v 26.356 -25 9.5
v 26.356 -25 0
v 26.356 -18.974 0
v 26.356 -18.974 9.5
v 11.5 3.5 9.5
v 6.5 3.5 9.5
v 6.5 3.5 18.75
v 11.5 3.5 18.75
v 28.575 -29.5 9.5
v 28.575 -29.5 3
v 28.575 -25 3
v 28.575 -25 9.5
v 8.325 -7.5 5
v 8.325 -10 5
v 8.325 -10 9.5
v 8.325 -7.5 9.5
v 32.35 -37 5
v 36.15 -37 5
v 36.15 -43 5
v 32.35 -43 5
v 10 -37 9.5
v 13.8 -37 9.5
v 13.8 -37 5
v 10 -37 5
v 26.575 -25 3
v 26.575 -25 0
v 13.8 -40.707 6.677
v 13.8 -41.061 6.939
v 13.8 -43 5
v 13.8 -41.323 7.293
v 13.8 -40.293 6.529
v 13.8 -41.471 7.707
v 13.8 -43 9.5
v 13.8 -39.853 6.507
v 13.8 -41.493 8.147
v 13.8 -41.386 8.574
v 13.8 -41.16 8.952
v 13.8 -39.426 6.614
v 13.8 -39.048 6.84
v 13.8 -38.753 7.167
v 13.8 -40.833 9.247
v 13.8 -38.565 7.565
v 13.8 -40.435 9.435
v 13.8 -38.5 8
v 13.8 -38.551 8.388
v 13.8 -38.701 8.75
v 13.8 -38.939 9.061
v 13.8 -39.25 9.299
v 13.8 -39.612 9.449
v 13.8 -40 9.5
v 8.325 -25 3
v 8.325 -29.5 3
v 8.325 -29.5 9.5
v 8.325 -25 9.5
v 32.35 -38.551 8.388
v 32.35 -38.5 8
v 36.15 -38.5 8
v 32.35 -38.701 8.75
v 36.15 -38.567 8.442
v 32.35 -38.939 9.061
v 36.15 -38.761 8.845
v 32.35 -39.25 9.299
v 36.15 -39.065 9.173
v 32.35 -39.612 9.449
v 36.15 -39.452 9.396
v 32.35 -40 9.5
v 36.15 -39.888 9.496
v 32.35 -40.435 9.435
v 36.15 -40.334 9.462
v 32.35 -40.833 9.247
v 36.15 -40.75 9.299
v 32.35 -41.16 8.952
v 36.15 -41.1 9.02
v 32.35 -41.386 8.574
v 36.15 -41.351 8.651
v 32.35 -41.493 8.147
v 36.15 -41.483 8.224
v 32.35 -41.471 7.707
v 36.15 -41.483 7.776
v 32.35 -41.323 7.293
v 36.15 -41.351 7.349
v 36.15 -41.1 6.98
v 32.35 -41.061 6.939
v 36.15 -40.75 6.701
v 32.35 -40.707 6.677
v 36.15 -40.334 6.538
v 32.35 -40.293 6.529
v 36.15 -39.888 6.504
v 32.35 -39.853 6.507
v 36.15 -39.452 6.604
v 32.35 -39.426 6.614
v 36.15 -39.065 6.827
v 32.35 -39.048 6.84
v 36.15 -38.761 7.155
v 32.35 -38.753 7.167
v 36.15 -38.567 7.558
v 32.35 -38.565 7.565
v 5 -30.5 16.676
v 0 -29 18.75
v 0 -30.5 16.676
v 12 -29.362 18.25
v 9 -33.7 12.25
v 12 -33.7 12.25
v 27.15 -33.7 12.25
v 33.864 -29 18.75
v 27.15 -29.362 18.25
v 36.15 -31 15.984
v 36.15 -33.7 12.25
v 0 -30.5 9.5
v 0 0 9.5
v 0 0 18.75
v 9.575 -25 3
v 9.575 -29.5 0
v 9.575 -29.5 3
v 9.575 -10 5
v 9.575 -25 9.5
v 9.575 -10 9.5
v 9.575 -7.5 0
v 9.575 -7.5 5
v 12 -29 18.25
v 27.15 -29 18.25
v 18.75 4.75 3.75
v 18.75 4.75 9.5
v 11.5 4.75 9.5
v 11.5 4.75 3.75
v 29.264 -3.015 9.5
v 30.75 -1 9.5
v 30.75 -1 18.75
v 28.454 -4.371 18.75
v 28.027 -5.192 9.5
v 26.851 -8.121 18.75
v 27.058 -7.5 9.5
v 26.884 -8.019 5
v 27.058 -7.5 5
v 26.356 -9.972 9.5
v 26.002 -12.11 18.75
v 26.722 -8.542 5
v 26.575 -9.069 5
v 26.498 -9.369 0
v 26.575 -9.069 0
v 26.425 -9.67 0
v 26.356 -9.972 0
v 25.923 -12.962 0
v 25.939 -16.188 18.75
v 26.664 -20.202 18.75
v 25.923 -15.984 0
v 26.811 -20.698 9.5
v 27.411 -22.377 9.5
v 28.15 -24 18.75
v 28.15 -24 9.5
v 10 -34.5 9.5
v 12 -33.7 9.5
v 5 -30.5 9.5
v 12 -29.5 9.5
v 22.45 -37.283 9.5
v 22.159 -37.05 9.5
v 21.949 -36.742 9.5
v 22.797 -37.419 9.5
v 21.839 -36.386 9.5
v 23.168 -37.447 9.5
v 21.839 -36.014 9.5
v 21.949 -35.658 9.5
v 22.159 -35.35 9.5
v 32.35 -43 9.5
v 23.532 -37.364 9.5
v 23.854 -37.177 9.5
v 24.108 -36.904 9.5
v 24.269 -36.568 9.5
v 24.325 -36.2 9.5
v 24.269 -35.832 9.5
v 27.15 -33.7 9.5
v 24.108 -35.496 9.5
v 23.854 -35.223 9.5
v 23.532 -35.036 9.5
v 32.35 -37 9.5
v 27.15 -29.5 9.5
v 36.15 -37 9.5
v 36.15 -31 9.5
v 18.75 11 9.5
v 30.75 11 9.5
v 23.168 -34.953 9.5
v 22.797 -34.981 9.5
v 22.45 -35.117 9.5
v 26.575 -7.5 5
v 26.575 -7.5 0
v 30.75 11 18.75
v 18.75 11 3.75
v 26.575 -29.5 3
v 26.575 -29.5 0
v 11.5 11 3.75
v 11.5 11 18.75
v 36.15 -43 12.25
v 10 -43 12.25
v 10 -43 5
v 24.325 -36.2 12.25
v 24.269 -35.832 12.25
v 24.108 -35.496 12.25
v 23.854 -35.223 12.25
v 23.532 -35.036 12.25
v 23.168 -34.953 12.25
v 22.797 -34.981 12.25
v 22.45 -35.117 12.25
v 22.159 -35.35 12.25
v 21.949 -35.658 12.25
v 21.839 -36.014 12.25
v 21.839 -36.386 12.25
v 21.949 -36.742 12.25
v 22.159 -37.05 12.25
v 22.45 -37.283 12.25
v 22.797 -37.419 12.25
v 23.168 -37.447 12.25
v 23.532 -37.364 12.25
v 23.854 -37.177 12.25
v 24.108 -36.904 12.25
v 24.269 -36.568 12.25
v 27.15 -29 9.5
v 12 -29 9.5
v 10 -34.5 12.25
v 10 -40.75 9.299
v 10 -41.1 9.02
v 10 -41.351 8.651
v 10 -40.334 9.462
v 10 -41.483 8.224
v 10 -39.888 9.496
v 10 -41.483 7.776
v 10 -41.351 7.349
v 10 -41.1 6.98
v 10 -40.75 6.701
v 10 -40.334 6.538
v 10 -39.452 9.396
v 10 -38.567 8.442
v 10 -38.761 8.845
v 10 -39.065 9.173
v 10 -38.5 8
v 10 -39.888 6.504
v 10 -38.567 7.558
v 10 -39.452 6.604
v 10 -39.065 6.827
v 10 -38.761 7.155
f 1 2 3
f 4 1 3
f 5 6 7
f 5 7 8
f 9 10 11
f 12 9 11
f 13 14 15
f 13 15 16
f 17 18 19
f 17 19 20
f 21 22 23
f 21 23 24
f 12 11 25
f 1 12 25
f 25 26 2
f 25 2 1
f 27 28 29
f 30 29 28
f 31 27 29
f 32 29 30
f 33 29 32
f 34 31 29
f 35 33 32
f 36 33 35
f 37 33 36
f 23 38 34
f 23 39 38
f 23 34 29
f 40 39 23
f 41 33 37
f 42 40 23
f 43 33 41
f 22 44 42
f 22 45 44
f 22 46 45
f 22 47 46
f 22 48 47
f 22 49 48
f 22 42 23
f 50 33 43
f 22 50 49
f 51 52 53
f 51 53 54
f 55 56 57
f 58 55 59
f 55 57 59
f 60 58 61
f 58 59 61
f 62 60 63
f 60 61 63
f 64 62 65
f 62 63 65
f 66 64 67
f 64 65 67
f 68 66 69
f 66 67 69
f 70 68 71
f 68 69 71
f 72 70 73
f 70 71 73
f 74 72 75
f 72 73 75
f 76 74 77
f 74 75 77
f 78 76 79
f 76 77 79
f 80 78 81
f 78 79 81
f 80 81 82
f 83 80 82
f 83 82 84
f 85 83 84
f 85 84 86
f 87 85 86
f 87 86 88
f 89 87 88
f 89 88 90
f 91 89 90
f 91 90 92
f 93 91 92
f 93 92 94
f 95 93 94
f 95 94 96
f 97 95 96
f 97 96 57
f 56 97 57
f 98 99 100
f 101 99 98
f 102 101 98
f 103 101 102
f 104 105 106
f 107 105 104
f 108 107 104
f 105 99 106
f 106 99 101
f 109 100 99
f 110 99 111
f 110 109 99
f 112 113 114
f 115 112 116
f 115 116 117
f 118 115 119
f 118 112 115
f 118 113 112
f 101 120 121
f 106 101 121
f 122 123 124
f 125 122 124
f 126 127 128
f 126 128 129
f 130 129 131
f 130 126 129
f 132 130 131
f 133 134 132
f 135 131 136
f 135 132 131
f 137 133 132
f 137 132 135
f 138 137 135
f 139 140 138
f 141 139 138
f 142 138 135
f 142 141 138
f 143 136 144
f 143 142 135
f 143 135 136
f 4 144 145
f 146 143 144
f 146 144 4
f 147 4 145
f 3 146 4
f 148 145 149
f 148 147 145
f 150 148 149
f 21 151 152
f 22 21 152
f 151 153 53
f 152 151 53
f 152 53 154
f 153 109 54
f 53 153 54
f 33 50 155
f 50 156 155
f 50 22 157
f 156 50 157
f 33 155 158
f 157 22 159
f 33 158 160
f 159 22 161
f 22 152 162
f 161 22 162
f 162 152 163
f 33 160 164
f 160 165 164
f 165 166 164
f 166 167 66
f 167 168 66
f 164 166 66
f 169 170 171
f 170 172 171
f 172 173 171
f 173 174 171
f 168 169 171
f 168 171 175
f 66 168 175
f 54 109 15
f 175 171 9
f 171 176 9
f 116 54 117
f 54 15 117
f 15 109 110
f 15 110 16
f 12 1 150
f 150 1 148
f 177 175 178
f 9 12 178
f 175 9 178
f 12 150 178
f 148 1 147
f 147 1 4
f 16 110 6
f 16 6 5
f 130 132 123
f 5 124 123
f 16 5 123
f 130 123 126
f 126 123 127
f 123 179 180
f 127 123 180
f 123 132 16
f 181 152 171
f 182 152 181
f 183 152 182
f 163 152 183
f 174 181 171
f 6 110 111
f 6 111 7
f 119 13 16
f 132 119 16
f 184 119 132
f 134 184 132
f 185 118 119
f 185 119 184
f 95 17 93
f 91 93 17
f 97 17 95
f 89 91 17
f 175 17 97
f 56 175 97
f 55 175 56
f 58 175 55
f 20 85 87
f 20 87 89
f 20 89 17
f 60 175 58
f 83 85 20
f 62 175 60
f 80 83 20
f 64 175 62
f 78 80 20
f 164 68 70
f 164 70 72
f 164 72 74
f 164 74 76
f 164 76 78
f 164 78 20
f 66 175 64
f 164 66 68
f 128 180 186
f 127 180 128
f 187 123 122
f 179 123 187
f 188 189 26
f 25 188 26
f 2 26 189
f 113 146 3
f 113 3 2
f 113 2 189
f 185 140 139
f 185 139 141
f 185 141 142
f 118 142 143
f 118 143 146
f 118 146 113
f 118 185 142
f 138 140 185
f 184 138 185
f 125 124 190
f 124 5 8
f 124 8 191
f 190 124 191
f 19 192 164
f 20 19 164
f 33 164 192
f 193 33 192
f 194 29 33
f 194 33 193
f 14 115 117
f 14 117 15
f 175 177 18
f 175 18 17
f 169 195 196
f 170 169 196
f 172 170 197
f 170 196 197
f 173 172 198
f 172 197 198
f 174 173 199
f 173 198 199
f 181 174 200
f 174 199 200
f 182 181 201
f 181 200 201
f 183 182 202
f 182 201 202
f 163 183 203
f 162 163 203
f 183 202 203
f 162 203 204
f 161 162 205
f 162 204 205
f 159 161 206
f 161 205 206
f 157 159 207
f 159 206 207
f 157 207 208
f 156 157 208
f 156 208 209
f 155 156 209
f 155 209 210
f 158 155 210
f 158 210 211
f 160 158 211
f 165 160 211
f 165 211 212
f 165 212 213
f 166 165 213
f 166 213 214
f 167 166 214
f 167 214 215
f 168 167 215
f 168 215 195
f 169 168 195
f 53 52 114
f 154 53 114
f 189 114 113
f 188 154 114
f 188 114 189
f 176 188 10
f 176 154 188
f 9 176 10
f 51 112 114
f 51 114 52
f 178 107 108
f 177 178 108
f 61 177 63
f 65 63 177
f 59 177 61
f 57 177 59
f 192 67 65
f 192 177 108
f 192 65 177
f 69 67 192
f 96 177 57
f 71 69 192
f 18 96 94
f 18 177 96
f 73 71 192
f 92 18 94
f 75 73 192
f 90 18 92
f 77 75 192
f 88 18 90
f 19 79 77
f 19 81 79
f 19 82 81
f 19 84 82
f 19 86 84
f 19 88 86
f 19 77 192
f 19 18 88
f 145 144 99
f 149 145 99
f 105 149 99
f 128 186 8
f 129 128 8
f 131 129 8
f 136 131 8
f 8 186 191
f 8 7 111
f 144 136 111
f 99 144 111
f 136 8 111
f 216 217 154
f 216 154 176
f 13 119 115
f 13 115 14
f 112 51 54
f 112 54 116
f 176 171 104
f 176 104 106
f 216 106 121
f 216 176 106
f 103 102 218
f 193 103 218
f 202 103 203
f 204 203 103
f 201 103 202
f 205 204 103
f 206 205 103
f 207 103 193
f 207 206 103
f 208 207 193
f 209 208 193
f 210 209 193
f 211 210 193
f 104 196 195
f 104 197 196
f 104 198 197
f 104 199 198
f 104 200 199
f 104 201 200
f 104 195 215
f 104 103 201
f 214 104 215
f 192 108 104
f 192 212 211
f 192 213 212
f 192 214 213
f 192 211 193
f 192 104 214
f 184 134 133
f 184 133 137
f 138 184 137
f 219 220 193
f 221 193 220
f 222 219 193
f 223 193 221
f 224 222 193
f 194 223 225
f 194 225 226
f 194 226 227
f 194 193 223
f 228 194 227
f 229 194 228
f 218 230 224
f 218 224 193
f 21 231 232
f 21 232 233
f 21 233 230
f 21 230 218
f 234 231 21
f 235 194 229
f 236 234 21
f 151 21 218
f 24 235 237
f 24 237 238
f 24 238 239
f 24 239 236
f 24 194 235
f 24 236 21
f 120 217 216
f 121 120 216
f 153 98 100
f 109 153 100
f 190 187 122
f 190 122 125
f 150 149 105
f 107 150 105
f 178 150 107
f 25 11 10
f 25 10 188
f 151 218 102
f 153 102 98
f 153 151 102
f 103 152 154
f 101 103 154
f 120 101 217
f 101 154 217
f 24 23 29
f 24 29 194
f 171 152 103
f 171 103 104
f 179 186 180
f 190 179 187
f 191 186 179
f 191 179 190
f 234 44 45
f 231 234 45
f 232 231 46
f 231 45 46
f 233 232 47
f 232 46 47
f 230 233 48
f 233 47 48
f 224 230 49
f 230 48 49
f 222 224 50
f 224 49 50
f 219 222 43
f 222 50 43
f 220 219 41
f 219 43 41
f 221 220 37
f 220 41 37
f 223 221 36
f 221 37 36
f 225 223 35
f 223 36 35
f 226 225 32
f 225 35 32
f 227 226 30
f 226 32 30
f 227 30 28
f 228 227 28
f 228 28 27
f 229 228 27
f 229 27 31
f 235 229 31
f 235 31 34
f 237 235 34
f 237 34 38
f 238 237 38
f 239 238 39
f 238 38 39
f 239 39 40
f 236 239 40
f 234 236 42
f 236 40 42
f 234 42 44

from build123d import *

# Parameters (mm, degrees)
BOSS_EXTRUDE1_DEPTH      = 18.75
SKETCH4_W                = 36.15
SKETCH4_H                = 12.5
CUT_EXTRUDE1_DEPTH       = 5
CUT_EXTRUDE2_DEPTH       = 6
CUT_EXTRUDE2_DEPTH_BACK  = 4.5
SKETCH6_R                = 1.5
CUT_EXTRUDE3_DEPTH       = 60.223179584
SKETCH7_W                = 2
SKETCH7_H                = 4.5
SKETCH7_W_2              = 1.25
CUT_EXTRUDE4_DEPTH       = 3
SKETCH7_3_W              = 1.25
SKETCH7_3_H              = 2.5
CUT_EXTRUDE5_DEPTH       = 5
CUT_EXTRUDE6_DEPTH       = 9.5
SKETCH9_W                = 7.25
SKETCH9_H                = 6.25
BOSS_EXTRUDE2_DEPTH      = 5.75
CUT_EXTRUDE7_DEPTH       = 9.5
CUT_EXTRUDE8_DEPTH       = 12
CUT_EXTRUDE8_DEPTH_BACK  = 54.706470746
CUT_EXTRUDE11_DEPTH      = 6
CUT_EXTRUDE11_DEPTH_BACK = 2.75
SKETCH12_W               = 15.15
SKETCH12_H               = 4.7
SKETCH13_R               = 1.25
CUT_EXTRUDE12_DEPTH      = 58.496825999


with BuildPart() as part:
    # Sketch1 → Boss-Extrude1 (new body)
    with BuildSketch(Plane.XY):
        with BuildLine():
            Line((11.5, 3.5), (11.5, 11))
            Line((11.5, 11), (30.75, 11))
            Line((30.75, 11), (30.75, -1))
            ThreePointArc((30.75, -1), (26.002013283, -12.110227589), (28.15, -24))
            Line((28.15, -24), (36.15, -31))
            Line((36.15, -31), (36.15, -43))
            Line((36.15, -43), (10, -43))
            Line((10, -43), (10, -34.5))
            Line((10, -34.5), (5, -30.5))
            Line((5, -30.5), (0, -30.5))
            Line((0, -30.5), (0, 0))
            Line((0, 0), (6.5, 3.5))
            Line((6.5, 3.5), (11.5, 3.5))
        make_face()
    extrude(amount=BOSS_EXTRUDE1_DEPTH)

    # Sketch4 → Cut-Extrude1 (cut)
    with BuildSketch(Plane(origin=(0, 0, 0), x_dir=(-1, 0, 0), z_dir=(0, 0, -1))):
        with Locations((-18.075, -36.75)):
            Rectangle(SKETCH4_W, SKETCH4_H)
    extrude(amount=-CUT_EXTRUDE1_DEPTH, mode=Mode.SUBTRACT)

    # Sketch5 → Cut-Extrude2 (cut, two sides: drawn at the far end of the back side and taken through both)
    with BuildSketch(Plane(origin=(0, 0, 5), x_dir=(-1, 0, 0), z_dir=(0, 0, -1)).offset(-CUT_EXTRUDE2_DEPTH_BACK)):
        Polygon((-32.35, -43), (-13.8, -43), (-13.8, -37), (0.902131261, -37), (0.902131261, -29.5), (-36.15, -29.5), (-36.15, -37), (-32.35, -37), align=None)
    extrude(amount=CUT_EXTRUDE2_DEPTH + CUT_EXTRUDE2_DEPTH_BACK, mode=Mode.SUBTRACT)

    # Sketch6 → Cut-Extrude3 (cut, through all)
    with BuildSketch(Plane(origin=(36.15, 0, 0), x_dir=(0, 0, -1), z_dir=(1, 0, 0))):
        with Locations(Location((-8, -40, 0), (0, 0, 90))):
            Circle(SKETCH6_R)
    extrude(amount=-CUT_EXTRUDE3_DEPTH, mode=Mode.SUBTRACT)

    # Sketch7 → Cut-Extrude4 (cut)
    with BuildSketch(Plane(origin=(0, 0, 0), x_dir=(-1, 0, 0), z_dir=(0, 0, -1))):
        with Locations((-27.575, -27.25)):
            Rectangle(SKETCH7_W, SKETCH7_H)
        with Locations((-8.95, -27.25)):
            Rectangle(SKETCH7_W_2, SKETCH7_H)
    extrude(amount=-CUT_EXTRUDE4_DEPTH, mode=Mode.SUBTRACT)

    # Sketch7<3> → Cut-Extrude5 (cut)
    with BuildSketch(Plane(origin=(0, 0, 0), x_dir=(-1, 0, 0), z_dir=(0, 0, -1))):
        with Locations((-8.95, -8.75)):
            Rectangle(SKETCH7_3_W, SKETCH7_3_H)
        with BuildLine():
            ThreePointArc((-27.058287436, -7.5), (-26.801337311, -8.279605972), (-26.575, -9.068643524))
            Line((-26.575, -9.068643524), (-26.575, -7.5))
            Line((-26.575, -7.5), (-27.058287436, -7.5))
        make_face()
    extrude(amount=-CUT_EXTRUDE5_DEPTH, mode=Mode.SUBTRACT)

    # Sketch8 → Cut-Extrude6 (cut)
    with BuildSketch(Plane(origin=(0, 0, 0), x_dir=(-1, 0, 0), z_dir=(0, 0, -1))):
        Polygon((-8.325, -10), (-8.325, -7.5), (-33.629917385, -7.5), (-33.629917385, 11), (0, 11), (0, -30.5), (-8.325, -30.5), (-8.325, -25), (-9.575, -25), (-9.575, -10), align=None)
    extrude(amount=-CUT_EXTRUDE6_DEPTH, mode=Mode.SUBTRACT)

    # Sketch9 → Boss-Extrude2 (add)
    with BuildSketch(Plane(origin=(0, 0, 9.5), x_dir=(-1, 0, 0), z_dir=(0, 0, -1))):
        with Locations((-15.125, 7.875)):
            Rectangle(SKETCH9_W, SKETCH9_H)
    extrude(amount=BOSS_EXTRUDE2_DEPTH)

    # Sketch10 → Cut-Extrude7 (cut)
    with BuildSketch(Plane(origin=(0, 0, 0), x_dir=(-1, 0, 0), z_dir=(0, 0, -1))):
        Polygon((-35.578571429, -29.5), (-28.575, -29.5), (-28.575, -25), (-26.356090024, -25), (-26.356090024, -9.972017094), (-27.488550882, -9.972017094), (-27.488550882, -22.567234298), (-35.578571429, -22.567234298), align=None)
    extrude(amount=-CUT_EXTRUDE7_DEPTH, mode=Mode.SUBTRACT)

    # Sketch11 → Cut-Extrude8 (cut, two sides: drawn at the far end of the back side and taken through both)
    with BuildSketch(Plane.ZY.offset(-10).offset(-CUT_EXTRUDE8_DEPTH_BACK)):
        Polygon((12.25, -43), (18.75, -43), (18.75, -29), (12.25, -33.7), align=None)
    extrude(amount=CUT_EXTRUDE8_DEPTH + CUT_EXTRUDE8_DEPTH_BACK, mode=Mode.SUBTRACT)

    # Sketch12 → Cut-Extrude11 (cut, two sides: drawn at the far end of the back side and taken through both)
    with BuildSketch(Plane.XY.offset(12.25).offset(-CUT_EXTRUDE11_DEPTH_BACK)):
        with Locations((19.575, -31.35)):
            Rectangle(SKETCH12_W, SKETCH12_H)
    extrude(amount=CUT_EXTRUDE11_DEPTH + CUT_EXTRUDE11_DEPTH_BACK, mode=Mode.SUBTRACT)

    # Sketch13 → Cut-Extrude12 (cut, through all)
    with BuildSketch(Plane.XY.offset(12.25)):
        with Locations((23.075, -36.2)):
            Circle(SKETCH13_R)
    extrude(amount=-CUT_EXTRUDE12_DEPTH, mode=Mode.SUBTRACT)


solid = part.part
